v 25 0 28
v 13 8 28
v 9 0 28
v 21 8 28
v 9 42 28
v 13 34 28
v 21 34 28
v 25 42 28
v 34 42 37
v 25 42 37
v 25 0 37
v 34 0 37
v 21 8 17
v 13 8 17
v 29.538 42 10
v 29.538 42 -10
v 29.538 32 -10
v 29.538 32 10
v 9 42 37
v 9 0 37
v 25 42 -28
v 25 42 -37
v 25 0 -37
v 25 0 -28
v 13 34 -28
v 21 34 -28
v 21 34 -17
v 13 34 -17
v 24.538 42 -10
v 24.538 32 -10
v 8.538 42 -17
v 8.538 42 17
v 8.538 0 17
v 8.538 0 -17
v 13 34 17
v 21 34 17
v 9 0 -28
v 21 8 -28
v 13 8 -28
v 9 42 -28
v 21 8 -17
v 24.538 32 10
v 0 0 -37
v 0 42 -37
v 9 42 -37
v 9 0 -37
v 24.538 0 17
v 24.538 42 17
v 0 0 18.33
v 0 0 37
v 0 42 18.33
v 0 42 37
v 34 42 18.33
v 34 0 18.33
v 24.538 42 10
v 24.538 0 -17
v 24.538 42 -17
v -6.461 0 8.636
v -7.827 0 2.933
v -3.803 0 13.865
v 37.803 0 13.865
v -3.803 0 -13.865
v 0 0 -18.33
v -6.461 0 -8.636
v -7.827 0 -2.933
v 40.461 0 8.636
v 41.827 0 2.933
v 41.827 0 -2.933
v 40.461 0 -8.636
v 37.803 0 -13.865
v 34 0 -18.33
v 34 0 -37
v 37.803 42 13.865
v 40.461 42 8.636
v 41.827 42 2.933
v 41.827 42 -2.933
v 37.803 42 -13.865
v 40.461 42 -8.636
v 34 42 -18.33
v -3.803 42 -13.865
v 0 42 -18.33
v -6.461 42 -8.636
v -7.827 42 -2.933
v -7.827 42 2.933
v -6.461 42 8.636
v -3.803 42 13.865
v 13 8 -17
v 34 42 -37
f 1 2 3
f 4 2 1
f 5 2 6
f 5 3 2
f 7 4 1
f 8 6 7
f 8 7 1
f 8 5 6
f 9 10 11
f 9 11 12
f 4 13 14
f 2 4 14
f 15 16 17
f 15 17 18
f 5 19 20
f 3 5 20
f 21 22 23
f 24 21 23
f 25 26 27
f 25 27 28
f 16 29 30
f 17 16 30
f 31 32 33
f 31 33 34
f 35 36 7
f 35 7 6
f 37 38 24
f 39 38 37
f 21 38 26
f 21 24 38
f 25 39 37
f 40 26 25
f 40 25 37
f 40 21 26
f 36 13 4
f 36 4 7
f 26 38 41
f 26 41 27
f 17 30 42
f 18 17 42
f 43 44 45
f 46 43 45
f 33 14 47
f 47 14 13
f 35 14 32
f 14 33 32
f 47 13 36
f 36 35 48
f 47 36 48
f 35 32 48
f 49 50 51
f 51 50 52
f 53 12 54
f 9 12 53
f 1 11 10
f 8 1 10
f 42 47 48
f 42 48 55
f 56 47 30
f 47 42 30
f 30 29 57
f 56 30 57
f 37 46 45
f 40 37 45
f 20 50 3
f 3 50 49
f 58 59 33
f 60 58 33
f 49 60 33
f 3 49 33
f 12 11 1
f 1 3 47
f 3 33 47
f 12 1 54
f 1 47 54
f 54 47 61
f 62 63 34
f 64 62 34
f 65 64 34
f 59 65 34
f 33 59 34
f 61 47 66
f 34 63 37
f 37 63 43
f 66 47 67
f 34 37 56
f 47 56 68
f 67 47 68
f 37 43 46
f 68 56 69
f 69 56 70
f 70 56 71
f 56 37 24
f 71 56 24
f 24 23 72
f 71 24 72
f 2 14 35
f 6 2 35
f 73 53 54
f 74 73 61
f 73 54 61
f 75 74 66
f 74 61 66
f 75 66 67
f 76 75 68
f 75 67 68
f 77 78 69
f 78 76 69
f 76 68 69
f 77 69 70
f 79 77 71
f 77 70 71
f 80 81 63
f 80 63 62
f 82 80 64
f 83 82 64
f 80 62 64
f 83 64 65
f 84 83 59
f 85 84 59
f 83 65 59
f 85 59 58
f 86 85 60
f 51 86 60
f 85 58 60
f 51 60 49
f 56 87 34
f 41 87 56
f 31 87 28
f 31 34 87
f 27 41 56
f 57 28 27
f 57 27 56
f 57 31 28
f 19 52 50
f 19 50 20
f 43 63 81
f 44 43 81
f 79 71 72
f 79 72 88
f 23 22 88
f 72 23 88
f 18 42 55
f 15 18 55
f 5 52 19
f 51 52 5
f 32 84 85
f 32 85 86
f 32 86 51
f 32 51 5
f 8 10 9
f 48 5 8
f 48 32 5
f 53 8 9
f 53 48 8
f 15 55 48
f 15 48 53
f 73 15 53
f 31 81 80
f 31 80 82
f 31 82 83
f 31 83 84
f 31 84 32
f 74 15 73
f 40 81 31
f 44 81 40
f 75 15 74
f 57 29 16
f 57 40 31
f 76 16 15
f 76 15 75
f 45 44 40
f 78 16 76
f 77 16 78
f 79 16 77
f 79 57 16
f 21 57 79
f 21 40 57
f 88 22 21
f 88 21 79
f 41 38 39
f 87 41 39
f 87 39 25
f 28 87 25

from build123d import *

# Parameters (mm, degrees)
SKETCH1_W           = 34
SKETCH1_H           = 42
BOSS_EXTRUDE1_DEPTH = 37
CUT_EXTRUDE1_DEPTH  = 9
CUT_EXTRUDE2_DEPTH  = 9
SKETCH9_R           = 25
BOSS_EXTRUDE3_DEPTH = 42
SKETCH10_W          = 16
SKETCH10_H          = 34
CUT_EXTRUDE5_DEPTH  = 70.978568148
CUT_EXTRUDE6_DEPTH  = 5
SKETCH13_W          = 8
SKETCH13_H          = 26
CUT_EXTRUDE7_DEPTH  = 89.051121515


with BuildPart() as part:
    # Sketch1 → Boss-Extrude1 (new, symmetric)
    with BuildSketch(Plane.XY):
        with Locations((17, 21)):
            Rectangle(SKETCH1_W, SKETCH1_H)
    extrude(amount=BOSS_EXTRUDE1_DEPTH, both=True)

    # Sketch2 → Cut-Extrude1 (cut)
    with BuildSketch(Plane.XY.offset(37)):
        Polygon((17, 42), (9, 42), (9, 0), (17, 0), (25, 0), (25, 42), align=None)
    extrude(amount=-CUT_EXTRUDE1_DEPTH, mode=Mode.SUBTRACT)

    # Sketch3 → Cut-Extrude2 (cut)
    with BuildSketch(Plane(origin=(0, 0, -37), x_dir=(-1, 0, 0), z_dir=(0, 0, -1))):
        Polygon((-17, 42), (-25, 42), (-25, 0), (-17, 0), (-9, 0), (-9, 42), align=None)
    extrude(amount=-CUT_EXTRUDE2_DEPTH, mode=Mode.SUBTRACT)

    # Sketch9 → Boss-Extrude3 (add, through all)
    with BuildSketch(Plane(origin=(0, 0, 0), x_dir=(1, 0, 0), z_dir=(0, 1, 0))):
        with Locations((17, 0)):
            Circle(SKETCH9_R)
    extrude(amount=BOSS_EXTRUDE3_DEPTH)

    # Sketch10 → Cut-Extrude5 (cut, through all)
    with BuildSketch(Plane(origin=(0, 42, 0), x_dir=(1, 0, 0), z_dir=(0, 1, 0))):
        with Locations((16.53776174, 0)):
            Rectangle(SKETCH10_W, SKETCH10_H)
    extrude(amount=-CUT_EXTRUDE5_DEPTH, mode=Mode.SUBTRACT)

    # Sketch11 → Cut-Extrude6 (cut)
    with BuildSketch(Plane.ZY.offset(-24.53776174)):
        Polygon((0, 42), (-10, 42), (-10, 32), (10, 32), (10, 42), align=None)
    extrude(amount=-CUT_EXTRUDE6_DEPTH, mode=Mode.SUBTRACT)

    # Sketch13 → Cut-Extrude7 (cut, through all)
    with BuildSketch(Plane(origin=(0, 0, -28), x_dir=(-1, 0, 0), z_dir=(0, 0, -1))):
        with Locations((-17, 21)):
            Rectangle(SKETCH13_W, SKETCH13_H)
    extrude(amount=-CUT_EXTRUDE7_DEPTH, mode=Mode.SUBTRACT)


solid = part.part
